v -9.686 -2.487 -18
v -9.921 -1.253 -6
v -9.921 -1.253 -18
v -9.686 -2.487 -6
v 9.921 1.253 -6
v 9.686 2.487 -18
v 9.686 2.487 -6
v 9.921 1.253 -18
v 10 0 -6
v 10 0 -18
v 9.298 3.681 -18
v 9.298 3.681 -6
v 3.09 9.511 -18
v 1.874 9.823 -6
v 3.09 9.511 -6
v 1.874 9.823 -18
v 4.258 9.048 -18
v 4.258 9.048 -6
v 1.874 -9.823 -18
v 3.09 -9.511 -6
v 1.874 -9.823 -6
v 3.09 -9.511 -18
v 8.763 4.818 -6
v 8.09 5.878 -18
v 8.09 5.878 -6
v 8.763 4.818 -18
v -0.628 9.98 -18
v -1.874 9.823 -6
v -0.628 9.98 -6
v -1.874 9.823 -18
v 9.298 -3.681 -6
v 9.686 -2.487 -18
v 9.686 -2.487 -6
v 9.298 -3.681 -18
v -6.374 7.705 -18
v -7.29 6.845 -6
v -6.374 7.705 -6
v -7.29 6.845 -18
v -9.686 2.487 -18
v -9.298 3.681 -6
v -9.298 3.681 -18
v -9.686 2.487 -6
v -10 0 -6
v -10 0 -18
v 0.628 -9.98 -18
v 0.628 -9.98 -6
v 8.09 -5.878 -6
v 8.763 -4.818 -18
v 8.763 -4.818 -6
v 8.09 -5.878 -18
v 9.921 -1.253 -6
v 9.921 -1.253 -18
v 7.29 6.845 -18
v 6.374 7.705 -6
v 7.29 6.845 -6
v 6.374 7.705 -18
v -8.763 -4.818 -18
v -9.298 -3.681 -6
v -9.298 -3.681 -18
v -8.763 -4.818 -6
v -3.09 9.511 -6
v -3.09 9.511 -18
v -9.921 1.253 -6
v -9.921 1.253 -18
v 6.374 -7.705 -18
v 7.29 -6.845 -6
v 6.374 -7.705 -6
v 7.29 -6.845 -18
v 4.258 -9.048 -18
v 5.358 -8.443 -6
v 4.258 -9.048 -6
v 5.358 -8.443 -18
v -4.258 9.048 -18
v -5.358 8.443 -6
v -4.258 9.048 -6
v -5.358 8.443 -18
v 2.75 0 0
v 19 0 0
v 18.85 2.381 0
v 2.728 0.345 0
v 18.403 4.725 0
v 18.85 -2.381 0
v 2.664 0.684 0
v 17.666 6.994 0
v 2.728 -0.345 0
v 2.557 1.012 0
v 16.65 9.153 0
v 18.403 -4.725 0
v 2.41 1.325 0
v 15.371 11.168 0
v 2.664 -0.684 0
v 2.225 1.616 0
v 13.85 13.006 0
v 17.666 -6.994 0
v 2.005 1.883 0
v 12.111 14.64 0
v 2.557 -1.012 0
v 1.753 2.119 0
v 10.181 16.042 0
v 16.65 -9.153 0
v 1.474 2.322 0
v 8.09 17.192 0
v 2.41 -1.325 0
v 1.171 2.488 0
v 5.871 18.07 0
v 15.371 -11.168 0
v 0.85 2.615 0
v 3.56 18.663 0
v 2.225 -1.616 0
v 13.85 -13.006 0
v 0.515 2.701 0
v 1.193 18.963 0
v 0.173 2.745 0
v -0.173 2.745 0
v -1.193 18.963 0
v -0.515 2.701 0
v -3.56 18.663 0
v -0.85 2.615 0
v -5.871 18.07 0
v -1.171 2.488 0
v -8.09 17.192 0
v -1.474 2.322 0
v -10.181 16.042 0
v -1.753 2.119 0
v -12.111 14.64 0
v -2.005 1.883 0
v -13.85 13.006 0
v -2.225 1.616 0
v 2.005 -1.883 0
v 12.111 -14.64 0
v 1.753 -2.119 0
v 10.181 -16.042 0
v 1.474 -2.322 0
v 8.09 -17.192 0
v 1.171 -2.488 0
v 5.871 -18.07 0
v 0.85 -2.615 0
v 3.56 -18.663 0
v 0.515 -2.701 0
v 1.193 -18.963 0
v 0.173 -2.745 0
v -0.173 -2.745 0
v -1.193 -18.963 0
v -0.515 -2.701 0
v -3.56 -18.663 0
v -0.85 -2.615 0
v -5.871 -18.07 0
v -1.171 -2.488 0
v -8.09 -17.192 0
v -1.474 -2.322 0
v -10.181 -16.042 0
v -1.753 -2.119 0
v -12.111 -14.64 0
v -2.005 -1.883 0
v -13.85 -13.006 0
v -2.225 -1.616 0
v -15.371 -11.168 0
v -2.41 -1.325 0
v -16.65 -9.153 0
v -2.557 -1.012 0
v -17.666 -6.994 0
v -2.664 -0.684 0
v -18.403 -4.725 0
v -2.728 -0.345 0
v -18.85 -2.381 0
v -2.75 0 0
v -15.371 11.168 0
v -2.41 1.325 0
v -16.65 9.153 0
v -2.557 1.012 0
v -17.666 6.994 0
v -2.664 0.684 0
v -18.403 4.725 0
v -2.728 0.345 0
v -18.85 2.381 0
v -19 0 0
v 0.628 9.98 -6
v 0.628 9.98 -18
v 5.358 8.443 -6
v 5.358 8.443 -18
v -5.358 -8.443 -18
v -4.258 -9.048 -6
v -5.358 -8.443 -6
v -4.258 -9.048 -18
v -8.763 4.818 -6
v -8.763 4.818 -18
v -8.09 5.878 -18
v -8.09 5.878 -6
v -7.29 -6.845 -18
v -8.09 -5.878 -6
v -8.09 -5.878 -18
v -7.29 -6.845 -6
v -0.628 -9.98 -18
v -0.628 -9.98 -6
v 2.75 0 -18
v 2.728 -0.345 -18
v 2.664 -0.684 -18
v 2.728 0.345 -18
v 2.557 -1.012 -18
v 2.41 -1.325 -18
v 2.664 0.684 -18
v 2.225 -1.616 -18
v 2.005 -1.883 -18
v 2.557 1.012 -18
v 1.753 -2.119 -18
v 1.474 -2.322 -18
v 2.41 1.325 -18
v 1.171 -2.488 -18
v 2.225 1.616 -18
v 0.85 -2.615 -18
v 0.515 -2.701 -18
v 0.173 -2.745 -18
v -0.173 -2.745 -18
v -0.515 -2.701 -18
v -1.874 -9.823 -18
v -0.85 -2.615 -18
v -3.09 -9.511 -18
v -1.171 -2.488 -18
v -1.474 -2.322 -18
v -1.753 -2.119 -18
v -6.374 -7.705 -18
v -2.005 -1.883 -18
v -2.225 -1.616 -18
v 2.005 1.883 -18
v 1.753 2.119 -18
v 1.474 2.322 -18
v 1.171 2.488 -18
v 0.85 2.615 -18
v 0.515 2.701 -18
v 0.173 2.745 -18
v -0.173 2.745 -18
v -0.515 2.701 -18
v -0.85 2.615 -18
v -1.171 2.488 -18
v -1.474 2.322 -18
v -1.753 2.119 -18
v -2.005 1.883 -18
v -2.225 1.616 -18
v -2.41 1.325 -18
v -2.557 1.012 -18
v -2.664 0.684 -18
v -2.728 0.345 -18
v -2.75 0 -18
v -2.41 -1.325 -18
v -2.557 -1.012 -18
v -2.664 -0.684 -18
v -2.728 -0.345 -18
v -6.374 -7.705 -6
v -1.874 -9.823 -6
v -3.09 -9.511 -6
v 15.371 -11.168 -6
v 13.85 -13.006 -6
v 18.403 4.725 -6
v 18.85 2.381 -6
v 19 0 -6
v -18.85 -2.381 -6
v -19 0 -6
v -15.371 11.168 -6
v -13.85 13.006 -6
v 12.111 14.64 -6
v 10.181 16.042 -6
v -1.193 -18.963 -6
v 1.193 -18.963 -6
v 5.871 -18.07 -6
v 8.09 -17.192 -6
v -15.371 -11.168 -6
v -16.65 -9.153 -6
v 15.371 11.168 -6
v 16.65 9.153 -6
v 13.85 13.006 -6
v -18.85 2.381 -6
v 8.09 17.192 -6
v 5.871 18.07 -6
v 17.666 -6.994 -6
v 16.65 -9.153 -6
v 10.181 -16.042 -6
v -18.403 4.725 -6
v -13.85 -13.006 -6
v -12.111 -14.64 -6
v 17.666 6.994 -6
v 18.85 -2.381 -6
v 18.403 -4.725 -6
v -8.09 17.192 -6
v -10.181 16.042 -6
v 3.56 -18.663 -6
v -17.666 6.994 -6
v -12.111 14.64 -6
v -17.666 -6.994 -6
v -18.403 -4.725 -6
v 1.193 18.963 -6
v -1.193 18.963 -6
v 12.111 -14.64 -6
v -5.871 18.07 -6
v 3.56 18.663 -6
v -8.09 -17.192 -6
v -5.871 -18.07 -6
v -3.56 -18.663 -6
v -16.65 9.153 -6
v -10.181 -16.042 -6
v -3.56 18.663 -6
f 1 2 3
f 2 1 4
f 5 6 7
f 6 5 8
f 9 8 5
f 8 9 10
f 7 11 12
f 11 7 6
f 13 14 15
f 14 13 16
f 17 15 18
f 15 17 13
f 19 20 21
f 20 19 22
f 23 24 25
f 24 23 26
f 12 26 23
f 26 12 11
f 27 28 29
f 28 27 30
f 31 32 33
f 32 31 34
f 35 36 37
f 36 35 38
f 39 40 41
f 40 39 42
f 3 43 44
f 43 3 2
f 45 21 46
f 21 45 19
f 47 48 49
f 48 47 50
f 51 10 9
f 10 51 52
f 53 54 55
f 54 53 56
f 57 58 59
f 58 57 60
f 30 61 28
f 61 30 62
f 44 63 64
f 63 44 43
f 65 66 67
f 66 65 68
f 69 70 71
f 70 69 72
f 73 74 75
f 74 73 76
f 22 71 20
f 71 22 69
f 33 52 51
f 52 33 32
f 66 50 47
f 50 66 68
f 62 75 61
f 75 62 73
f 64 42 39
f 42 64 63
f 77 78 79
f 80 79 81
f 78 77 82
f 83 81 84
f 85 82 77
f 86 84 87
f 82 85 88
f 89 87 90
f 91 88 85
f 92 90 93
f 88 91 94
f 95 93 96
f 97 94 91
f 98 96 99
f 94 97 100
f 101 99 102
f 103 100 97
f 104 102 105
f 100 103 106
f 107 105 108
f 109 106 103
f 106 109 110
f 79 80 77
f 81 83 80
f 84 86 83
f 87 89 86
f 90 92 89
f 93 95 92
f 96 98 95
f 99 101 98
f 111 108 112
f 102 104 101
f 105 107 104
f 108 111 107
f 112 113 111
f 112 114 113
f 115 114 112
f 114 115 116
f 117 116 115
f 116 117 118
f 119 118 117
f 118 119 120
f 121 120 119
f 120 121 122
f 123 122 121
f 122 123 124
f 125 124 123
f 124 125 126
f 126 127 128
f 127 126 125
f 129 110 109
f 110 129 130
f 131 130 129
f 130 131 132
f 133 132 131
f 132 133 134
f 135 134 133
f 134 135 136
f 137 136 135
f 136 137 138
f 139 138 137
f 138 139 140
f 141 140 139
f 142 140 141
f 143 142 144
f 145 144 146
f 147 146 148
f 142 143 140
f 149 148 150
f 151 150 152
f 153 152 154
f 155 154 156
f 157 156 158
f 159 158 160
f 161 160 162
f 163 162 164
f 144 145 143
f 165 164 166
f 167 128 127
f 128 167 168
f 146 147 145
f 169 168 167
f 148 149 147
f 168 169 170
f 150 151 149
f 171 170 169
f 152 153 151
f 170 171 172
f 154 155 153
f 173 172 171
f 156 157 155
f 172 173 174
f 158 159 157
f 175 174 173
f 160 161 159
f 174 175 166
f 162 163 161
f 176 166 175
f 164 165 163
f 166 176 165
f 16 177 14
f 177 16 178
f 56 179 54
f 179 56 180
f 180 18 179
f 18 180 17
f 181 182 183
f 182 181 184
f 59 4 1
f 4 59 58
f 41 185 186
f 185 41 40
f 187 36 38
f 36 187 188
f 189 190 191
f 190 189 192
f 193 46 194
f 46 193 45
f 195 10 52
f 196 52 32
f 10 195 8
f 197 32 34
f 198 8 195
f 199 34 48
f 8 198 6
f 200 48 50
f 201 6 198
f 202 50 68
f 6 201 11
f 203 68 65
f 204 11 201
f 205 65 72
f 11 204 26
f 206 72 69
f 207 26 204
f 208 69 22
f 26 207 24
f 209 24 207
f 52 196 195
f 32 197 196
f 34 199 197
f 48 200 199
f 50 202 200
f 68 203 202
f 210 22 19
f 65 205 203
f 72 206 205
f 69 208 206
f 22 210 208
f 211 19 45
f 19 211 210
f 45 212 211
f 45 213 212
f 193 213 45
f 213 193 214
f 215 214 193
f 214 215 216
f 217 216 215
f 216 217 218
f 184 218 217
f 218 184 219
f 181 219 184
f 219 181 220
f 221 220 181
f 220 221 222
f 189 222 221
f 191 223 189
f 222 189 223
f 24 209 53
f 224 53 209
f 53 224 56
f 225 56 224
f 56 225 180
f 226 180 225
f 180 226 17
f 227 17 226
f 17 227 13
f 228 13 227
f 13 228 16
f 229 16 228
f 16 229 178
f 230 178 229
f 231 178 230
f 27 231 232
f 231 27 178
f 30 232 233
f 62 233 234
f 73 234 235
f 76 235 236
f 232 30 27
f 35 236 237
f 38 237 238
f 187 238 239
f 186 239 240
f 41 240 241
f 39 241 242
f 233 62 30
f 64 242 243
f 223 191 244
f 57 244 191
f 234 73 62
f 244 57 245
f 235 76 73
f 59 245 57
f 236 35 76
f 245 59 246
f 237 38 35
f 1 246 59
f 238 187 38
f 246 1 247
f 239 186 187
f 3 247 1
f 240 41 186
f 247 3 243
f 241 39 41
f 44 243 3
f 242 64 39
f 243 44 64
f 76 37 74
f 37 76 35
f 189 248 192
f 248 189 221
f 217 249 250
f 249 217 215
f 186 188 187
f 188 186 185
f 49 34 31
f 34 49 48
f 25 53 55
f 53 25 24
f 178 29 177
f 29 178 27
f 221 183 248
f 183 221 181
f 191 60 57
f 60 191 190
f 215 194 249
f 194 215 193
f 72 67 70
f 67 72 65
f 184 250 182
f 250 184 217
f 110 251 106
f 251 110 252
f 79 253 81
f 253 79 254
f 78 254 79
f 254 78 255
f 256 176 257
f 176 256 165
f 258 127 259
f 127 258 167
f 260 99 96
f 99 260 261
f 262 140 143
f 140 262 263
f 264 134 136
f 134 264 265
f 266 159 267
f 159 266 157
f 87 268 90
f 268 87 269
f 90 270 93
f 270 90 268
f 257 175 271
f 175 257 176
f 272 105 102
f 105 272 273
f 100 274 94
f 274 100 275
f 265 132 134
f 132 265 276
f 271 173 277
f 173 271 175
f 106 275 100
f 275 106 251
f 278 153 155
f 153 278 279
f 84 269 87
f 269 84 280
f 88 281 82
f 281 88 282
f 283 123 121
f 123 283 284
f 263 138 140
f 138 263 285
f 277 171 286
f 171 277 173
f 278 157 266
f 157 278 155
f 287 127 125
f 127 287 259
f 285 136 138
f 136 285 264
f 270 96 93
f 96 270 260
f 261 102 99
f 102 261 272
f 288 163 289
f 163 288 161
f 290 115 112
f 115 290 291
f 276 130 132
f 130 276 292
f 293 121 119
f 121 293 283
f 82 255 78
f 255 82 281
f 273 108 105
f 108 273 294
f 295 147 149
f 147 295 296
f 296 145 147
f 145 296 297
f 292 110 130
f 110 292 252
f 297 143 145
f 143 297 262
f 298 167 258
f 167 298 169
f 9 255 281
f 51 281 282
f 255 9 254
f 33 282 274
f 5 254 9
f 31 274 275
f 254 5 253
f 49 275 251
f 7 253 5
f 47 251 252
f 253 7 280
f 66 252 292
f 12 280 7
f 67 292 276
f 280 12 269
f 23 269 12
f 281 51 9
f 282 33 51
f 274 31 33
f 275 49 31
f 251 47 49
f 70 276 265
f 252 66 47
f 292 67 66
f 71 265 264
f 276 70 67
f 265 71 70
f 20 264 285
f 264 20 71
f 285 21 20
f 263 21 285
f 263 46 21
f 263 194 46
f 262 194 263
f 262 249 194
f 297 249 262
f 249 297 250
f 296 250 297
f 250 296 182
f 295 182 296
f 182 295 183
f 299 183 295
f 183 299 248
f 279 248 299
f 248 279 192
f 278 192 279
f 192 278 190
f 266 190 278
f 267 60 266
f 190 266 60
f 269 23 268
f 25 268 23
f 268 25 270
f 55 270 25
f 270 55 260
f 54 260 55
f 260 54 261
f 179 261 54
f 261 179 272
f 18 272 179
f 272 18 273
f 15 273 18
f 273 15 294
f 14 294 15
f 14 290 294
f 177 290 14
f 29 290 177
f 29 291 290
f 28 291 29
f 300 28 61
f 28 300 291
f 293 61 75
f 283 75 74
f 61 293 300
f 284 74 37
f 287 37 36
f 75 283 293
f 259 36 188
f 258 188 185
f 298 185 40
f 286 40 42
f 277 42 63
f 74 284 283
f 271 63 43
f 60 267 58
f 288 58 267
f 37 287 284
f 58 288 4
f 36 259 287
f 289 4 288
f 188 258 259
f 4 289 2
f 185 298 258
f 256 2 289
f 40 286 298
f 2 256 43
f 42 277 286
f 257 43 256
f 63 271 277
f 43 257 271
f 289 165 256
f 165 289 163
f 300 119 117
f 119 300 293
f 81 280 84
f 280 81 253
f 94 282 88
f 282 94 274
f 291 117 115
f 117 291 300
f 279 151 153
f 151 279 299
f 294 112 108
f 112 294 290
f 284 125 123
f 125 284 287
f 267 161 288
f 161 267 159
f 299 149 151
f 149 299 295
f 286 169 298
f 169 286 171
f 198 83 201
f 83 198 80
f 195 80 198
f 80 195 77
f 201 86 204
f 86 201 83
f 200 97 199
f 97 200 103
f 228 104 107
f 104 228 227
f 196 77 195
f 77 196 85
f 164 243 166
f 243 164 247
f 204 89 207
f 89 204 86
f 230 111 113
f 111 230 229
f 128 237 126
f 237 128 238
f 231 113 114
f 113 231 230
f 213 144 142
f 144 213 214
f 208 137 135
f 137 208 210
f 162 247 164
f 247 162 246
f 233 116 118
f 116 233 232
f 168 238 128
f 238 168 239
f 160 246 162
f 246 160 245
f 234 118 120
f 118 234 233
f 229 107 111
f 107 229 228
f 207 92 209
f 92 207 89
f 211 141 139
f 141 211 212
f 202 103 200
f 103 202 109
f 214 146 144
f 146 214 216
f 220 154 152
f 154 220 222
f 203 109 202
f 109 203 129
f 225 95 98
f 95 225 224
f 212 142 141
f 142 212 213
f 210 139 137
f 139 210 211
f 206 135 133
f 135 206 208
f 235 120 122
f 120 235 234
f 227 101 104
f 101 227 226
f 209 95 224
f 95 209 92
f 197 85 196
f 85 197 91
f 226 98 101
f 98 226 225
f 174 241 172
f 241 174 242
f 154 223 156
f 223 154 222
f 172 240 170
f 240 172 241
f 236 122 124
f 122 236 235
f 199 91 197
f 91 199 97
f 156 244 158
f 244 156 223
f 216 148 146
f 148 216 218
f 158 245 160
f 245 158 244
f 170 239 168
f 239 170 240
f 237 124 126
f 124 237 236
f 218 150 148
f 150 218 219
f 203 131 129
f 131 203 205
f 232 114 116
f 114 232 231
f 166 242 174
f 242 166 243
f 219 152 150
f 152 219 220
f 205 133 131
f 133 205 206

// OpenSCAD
$fn = 50;


difference() {
	union() {
		translate(v = [0, 0, -18.0000000000]) {
			cylinder(h = 18, r = 10.0000000000);
		}
		translate(v = [0, 0, -6.0000000000]) {
			cylinder(h = 6, r = 19.0000000000);
		}
	}
	union() {
		#translate(v = [0, 0, -18]) {
			cylinder(h = 18, r = 2.7500000000);
		}
	}
}
